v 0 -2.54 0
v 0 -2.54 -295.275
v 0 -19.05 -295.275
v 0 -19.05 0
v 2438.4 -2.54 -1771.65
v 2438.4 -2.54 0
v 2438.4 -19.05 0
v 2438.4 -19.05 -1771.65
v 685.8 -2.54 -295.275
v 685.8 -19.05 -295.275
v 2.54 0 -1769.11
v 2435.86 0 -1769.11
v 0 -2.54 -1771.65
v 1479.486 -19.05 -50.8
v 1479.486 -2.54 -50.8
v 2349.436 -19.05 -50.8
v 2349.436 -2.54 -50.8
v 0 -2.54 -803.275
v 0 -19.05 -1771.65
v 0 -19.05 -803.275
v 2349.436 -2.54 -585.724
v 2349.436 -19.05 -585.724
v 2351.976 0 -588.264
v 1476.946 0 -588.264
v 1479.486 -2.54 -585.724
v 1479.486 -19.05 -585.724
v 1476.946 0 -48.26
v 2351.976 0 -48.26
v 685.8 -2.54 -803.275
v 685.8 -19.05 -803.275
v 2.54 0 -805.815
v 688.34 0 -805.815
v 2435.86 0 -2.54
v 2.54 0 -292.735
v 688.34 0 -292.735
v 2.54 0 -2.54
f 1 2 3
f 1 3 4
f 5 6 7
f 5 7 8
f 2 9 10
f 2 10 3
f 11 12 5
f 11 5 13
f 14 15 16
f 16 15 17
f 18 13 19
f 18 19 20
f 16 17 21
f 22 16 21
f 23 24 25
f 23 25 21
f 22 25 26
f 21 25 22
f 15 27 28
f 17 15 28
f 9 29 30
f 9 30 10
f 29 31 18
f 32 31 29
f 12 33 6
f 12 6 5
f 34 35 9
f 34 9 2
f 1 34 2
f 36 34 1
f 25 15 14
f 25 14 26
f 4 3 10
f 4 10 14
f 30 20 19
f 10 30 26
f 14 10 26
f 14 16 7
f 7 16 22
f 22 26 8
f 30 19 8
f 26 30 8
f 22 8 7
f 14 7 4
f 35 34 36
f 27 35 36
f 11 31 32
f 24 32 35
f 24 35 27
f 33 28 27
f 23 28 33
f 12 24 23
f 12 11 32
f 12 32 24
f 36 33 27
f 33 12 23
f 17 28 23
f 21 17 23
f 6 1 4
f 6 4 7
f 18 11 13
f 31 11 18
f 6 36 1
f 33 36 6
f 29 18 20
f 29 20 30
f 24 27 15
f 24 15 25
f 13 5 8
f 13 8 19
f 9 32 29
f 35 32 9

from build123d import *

# Parameters (mm, degrees)
SKETCH1_W           = 869.95
SKETCH1_H           = 534.924
BOSS_EXTRUDE1_DEPTH = 19.05
CHAMFER1_SIZE       = 2.54


with BuildPart() as part:
    # Sketch1 → Boss-Extrude1 (new body)
    with BuildSketch(Plane(origin=(0, 0, 0), x_dir=(1, 0, 0), z_dir=(0, 1, 0))):
        Polygon((2438.4, 0), (2438.4, 1771.65), (0, 1771.65), (0, 803.275), (685.8, 803.275), (685.8, 295.275), (0, 295.275), (0, 0), align=None)
        with Locations((1914.4615, 318.262)):
            Rectangle(SKETCH1_W, SKETCH1_H, mode=Mode.SUBTRACT)
    extrude(amount=-BOSS_EXTRUDE1_DEPTH)

    # Chamfer1
    chamfer1_edges = [part.edges().sort_by_distance(p)[0] for p in [
        (0, 0, -1287.4625),
        (1219.2, 0, -1771.65),
        (2438.4, 0, -885.825),
        (1219.2, 0, 0),
        (1914.4615, 0, -585.724),
        (1479.4865, 0, -318.262),
        (1914.4615, 0, -50.8),
        (2349.4365, 0, -318.262),
        (0, 0, -147.6375),
        (342.9, 0, -295.275),
        (685.8, 0, -549.275),
        (342.9, 0, -803.275),
    ]]
    chamfer(chamfer1_edges, length=CHAMFER1_SIZE)


solid = part.part
